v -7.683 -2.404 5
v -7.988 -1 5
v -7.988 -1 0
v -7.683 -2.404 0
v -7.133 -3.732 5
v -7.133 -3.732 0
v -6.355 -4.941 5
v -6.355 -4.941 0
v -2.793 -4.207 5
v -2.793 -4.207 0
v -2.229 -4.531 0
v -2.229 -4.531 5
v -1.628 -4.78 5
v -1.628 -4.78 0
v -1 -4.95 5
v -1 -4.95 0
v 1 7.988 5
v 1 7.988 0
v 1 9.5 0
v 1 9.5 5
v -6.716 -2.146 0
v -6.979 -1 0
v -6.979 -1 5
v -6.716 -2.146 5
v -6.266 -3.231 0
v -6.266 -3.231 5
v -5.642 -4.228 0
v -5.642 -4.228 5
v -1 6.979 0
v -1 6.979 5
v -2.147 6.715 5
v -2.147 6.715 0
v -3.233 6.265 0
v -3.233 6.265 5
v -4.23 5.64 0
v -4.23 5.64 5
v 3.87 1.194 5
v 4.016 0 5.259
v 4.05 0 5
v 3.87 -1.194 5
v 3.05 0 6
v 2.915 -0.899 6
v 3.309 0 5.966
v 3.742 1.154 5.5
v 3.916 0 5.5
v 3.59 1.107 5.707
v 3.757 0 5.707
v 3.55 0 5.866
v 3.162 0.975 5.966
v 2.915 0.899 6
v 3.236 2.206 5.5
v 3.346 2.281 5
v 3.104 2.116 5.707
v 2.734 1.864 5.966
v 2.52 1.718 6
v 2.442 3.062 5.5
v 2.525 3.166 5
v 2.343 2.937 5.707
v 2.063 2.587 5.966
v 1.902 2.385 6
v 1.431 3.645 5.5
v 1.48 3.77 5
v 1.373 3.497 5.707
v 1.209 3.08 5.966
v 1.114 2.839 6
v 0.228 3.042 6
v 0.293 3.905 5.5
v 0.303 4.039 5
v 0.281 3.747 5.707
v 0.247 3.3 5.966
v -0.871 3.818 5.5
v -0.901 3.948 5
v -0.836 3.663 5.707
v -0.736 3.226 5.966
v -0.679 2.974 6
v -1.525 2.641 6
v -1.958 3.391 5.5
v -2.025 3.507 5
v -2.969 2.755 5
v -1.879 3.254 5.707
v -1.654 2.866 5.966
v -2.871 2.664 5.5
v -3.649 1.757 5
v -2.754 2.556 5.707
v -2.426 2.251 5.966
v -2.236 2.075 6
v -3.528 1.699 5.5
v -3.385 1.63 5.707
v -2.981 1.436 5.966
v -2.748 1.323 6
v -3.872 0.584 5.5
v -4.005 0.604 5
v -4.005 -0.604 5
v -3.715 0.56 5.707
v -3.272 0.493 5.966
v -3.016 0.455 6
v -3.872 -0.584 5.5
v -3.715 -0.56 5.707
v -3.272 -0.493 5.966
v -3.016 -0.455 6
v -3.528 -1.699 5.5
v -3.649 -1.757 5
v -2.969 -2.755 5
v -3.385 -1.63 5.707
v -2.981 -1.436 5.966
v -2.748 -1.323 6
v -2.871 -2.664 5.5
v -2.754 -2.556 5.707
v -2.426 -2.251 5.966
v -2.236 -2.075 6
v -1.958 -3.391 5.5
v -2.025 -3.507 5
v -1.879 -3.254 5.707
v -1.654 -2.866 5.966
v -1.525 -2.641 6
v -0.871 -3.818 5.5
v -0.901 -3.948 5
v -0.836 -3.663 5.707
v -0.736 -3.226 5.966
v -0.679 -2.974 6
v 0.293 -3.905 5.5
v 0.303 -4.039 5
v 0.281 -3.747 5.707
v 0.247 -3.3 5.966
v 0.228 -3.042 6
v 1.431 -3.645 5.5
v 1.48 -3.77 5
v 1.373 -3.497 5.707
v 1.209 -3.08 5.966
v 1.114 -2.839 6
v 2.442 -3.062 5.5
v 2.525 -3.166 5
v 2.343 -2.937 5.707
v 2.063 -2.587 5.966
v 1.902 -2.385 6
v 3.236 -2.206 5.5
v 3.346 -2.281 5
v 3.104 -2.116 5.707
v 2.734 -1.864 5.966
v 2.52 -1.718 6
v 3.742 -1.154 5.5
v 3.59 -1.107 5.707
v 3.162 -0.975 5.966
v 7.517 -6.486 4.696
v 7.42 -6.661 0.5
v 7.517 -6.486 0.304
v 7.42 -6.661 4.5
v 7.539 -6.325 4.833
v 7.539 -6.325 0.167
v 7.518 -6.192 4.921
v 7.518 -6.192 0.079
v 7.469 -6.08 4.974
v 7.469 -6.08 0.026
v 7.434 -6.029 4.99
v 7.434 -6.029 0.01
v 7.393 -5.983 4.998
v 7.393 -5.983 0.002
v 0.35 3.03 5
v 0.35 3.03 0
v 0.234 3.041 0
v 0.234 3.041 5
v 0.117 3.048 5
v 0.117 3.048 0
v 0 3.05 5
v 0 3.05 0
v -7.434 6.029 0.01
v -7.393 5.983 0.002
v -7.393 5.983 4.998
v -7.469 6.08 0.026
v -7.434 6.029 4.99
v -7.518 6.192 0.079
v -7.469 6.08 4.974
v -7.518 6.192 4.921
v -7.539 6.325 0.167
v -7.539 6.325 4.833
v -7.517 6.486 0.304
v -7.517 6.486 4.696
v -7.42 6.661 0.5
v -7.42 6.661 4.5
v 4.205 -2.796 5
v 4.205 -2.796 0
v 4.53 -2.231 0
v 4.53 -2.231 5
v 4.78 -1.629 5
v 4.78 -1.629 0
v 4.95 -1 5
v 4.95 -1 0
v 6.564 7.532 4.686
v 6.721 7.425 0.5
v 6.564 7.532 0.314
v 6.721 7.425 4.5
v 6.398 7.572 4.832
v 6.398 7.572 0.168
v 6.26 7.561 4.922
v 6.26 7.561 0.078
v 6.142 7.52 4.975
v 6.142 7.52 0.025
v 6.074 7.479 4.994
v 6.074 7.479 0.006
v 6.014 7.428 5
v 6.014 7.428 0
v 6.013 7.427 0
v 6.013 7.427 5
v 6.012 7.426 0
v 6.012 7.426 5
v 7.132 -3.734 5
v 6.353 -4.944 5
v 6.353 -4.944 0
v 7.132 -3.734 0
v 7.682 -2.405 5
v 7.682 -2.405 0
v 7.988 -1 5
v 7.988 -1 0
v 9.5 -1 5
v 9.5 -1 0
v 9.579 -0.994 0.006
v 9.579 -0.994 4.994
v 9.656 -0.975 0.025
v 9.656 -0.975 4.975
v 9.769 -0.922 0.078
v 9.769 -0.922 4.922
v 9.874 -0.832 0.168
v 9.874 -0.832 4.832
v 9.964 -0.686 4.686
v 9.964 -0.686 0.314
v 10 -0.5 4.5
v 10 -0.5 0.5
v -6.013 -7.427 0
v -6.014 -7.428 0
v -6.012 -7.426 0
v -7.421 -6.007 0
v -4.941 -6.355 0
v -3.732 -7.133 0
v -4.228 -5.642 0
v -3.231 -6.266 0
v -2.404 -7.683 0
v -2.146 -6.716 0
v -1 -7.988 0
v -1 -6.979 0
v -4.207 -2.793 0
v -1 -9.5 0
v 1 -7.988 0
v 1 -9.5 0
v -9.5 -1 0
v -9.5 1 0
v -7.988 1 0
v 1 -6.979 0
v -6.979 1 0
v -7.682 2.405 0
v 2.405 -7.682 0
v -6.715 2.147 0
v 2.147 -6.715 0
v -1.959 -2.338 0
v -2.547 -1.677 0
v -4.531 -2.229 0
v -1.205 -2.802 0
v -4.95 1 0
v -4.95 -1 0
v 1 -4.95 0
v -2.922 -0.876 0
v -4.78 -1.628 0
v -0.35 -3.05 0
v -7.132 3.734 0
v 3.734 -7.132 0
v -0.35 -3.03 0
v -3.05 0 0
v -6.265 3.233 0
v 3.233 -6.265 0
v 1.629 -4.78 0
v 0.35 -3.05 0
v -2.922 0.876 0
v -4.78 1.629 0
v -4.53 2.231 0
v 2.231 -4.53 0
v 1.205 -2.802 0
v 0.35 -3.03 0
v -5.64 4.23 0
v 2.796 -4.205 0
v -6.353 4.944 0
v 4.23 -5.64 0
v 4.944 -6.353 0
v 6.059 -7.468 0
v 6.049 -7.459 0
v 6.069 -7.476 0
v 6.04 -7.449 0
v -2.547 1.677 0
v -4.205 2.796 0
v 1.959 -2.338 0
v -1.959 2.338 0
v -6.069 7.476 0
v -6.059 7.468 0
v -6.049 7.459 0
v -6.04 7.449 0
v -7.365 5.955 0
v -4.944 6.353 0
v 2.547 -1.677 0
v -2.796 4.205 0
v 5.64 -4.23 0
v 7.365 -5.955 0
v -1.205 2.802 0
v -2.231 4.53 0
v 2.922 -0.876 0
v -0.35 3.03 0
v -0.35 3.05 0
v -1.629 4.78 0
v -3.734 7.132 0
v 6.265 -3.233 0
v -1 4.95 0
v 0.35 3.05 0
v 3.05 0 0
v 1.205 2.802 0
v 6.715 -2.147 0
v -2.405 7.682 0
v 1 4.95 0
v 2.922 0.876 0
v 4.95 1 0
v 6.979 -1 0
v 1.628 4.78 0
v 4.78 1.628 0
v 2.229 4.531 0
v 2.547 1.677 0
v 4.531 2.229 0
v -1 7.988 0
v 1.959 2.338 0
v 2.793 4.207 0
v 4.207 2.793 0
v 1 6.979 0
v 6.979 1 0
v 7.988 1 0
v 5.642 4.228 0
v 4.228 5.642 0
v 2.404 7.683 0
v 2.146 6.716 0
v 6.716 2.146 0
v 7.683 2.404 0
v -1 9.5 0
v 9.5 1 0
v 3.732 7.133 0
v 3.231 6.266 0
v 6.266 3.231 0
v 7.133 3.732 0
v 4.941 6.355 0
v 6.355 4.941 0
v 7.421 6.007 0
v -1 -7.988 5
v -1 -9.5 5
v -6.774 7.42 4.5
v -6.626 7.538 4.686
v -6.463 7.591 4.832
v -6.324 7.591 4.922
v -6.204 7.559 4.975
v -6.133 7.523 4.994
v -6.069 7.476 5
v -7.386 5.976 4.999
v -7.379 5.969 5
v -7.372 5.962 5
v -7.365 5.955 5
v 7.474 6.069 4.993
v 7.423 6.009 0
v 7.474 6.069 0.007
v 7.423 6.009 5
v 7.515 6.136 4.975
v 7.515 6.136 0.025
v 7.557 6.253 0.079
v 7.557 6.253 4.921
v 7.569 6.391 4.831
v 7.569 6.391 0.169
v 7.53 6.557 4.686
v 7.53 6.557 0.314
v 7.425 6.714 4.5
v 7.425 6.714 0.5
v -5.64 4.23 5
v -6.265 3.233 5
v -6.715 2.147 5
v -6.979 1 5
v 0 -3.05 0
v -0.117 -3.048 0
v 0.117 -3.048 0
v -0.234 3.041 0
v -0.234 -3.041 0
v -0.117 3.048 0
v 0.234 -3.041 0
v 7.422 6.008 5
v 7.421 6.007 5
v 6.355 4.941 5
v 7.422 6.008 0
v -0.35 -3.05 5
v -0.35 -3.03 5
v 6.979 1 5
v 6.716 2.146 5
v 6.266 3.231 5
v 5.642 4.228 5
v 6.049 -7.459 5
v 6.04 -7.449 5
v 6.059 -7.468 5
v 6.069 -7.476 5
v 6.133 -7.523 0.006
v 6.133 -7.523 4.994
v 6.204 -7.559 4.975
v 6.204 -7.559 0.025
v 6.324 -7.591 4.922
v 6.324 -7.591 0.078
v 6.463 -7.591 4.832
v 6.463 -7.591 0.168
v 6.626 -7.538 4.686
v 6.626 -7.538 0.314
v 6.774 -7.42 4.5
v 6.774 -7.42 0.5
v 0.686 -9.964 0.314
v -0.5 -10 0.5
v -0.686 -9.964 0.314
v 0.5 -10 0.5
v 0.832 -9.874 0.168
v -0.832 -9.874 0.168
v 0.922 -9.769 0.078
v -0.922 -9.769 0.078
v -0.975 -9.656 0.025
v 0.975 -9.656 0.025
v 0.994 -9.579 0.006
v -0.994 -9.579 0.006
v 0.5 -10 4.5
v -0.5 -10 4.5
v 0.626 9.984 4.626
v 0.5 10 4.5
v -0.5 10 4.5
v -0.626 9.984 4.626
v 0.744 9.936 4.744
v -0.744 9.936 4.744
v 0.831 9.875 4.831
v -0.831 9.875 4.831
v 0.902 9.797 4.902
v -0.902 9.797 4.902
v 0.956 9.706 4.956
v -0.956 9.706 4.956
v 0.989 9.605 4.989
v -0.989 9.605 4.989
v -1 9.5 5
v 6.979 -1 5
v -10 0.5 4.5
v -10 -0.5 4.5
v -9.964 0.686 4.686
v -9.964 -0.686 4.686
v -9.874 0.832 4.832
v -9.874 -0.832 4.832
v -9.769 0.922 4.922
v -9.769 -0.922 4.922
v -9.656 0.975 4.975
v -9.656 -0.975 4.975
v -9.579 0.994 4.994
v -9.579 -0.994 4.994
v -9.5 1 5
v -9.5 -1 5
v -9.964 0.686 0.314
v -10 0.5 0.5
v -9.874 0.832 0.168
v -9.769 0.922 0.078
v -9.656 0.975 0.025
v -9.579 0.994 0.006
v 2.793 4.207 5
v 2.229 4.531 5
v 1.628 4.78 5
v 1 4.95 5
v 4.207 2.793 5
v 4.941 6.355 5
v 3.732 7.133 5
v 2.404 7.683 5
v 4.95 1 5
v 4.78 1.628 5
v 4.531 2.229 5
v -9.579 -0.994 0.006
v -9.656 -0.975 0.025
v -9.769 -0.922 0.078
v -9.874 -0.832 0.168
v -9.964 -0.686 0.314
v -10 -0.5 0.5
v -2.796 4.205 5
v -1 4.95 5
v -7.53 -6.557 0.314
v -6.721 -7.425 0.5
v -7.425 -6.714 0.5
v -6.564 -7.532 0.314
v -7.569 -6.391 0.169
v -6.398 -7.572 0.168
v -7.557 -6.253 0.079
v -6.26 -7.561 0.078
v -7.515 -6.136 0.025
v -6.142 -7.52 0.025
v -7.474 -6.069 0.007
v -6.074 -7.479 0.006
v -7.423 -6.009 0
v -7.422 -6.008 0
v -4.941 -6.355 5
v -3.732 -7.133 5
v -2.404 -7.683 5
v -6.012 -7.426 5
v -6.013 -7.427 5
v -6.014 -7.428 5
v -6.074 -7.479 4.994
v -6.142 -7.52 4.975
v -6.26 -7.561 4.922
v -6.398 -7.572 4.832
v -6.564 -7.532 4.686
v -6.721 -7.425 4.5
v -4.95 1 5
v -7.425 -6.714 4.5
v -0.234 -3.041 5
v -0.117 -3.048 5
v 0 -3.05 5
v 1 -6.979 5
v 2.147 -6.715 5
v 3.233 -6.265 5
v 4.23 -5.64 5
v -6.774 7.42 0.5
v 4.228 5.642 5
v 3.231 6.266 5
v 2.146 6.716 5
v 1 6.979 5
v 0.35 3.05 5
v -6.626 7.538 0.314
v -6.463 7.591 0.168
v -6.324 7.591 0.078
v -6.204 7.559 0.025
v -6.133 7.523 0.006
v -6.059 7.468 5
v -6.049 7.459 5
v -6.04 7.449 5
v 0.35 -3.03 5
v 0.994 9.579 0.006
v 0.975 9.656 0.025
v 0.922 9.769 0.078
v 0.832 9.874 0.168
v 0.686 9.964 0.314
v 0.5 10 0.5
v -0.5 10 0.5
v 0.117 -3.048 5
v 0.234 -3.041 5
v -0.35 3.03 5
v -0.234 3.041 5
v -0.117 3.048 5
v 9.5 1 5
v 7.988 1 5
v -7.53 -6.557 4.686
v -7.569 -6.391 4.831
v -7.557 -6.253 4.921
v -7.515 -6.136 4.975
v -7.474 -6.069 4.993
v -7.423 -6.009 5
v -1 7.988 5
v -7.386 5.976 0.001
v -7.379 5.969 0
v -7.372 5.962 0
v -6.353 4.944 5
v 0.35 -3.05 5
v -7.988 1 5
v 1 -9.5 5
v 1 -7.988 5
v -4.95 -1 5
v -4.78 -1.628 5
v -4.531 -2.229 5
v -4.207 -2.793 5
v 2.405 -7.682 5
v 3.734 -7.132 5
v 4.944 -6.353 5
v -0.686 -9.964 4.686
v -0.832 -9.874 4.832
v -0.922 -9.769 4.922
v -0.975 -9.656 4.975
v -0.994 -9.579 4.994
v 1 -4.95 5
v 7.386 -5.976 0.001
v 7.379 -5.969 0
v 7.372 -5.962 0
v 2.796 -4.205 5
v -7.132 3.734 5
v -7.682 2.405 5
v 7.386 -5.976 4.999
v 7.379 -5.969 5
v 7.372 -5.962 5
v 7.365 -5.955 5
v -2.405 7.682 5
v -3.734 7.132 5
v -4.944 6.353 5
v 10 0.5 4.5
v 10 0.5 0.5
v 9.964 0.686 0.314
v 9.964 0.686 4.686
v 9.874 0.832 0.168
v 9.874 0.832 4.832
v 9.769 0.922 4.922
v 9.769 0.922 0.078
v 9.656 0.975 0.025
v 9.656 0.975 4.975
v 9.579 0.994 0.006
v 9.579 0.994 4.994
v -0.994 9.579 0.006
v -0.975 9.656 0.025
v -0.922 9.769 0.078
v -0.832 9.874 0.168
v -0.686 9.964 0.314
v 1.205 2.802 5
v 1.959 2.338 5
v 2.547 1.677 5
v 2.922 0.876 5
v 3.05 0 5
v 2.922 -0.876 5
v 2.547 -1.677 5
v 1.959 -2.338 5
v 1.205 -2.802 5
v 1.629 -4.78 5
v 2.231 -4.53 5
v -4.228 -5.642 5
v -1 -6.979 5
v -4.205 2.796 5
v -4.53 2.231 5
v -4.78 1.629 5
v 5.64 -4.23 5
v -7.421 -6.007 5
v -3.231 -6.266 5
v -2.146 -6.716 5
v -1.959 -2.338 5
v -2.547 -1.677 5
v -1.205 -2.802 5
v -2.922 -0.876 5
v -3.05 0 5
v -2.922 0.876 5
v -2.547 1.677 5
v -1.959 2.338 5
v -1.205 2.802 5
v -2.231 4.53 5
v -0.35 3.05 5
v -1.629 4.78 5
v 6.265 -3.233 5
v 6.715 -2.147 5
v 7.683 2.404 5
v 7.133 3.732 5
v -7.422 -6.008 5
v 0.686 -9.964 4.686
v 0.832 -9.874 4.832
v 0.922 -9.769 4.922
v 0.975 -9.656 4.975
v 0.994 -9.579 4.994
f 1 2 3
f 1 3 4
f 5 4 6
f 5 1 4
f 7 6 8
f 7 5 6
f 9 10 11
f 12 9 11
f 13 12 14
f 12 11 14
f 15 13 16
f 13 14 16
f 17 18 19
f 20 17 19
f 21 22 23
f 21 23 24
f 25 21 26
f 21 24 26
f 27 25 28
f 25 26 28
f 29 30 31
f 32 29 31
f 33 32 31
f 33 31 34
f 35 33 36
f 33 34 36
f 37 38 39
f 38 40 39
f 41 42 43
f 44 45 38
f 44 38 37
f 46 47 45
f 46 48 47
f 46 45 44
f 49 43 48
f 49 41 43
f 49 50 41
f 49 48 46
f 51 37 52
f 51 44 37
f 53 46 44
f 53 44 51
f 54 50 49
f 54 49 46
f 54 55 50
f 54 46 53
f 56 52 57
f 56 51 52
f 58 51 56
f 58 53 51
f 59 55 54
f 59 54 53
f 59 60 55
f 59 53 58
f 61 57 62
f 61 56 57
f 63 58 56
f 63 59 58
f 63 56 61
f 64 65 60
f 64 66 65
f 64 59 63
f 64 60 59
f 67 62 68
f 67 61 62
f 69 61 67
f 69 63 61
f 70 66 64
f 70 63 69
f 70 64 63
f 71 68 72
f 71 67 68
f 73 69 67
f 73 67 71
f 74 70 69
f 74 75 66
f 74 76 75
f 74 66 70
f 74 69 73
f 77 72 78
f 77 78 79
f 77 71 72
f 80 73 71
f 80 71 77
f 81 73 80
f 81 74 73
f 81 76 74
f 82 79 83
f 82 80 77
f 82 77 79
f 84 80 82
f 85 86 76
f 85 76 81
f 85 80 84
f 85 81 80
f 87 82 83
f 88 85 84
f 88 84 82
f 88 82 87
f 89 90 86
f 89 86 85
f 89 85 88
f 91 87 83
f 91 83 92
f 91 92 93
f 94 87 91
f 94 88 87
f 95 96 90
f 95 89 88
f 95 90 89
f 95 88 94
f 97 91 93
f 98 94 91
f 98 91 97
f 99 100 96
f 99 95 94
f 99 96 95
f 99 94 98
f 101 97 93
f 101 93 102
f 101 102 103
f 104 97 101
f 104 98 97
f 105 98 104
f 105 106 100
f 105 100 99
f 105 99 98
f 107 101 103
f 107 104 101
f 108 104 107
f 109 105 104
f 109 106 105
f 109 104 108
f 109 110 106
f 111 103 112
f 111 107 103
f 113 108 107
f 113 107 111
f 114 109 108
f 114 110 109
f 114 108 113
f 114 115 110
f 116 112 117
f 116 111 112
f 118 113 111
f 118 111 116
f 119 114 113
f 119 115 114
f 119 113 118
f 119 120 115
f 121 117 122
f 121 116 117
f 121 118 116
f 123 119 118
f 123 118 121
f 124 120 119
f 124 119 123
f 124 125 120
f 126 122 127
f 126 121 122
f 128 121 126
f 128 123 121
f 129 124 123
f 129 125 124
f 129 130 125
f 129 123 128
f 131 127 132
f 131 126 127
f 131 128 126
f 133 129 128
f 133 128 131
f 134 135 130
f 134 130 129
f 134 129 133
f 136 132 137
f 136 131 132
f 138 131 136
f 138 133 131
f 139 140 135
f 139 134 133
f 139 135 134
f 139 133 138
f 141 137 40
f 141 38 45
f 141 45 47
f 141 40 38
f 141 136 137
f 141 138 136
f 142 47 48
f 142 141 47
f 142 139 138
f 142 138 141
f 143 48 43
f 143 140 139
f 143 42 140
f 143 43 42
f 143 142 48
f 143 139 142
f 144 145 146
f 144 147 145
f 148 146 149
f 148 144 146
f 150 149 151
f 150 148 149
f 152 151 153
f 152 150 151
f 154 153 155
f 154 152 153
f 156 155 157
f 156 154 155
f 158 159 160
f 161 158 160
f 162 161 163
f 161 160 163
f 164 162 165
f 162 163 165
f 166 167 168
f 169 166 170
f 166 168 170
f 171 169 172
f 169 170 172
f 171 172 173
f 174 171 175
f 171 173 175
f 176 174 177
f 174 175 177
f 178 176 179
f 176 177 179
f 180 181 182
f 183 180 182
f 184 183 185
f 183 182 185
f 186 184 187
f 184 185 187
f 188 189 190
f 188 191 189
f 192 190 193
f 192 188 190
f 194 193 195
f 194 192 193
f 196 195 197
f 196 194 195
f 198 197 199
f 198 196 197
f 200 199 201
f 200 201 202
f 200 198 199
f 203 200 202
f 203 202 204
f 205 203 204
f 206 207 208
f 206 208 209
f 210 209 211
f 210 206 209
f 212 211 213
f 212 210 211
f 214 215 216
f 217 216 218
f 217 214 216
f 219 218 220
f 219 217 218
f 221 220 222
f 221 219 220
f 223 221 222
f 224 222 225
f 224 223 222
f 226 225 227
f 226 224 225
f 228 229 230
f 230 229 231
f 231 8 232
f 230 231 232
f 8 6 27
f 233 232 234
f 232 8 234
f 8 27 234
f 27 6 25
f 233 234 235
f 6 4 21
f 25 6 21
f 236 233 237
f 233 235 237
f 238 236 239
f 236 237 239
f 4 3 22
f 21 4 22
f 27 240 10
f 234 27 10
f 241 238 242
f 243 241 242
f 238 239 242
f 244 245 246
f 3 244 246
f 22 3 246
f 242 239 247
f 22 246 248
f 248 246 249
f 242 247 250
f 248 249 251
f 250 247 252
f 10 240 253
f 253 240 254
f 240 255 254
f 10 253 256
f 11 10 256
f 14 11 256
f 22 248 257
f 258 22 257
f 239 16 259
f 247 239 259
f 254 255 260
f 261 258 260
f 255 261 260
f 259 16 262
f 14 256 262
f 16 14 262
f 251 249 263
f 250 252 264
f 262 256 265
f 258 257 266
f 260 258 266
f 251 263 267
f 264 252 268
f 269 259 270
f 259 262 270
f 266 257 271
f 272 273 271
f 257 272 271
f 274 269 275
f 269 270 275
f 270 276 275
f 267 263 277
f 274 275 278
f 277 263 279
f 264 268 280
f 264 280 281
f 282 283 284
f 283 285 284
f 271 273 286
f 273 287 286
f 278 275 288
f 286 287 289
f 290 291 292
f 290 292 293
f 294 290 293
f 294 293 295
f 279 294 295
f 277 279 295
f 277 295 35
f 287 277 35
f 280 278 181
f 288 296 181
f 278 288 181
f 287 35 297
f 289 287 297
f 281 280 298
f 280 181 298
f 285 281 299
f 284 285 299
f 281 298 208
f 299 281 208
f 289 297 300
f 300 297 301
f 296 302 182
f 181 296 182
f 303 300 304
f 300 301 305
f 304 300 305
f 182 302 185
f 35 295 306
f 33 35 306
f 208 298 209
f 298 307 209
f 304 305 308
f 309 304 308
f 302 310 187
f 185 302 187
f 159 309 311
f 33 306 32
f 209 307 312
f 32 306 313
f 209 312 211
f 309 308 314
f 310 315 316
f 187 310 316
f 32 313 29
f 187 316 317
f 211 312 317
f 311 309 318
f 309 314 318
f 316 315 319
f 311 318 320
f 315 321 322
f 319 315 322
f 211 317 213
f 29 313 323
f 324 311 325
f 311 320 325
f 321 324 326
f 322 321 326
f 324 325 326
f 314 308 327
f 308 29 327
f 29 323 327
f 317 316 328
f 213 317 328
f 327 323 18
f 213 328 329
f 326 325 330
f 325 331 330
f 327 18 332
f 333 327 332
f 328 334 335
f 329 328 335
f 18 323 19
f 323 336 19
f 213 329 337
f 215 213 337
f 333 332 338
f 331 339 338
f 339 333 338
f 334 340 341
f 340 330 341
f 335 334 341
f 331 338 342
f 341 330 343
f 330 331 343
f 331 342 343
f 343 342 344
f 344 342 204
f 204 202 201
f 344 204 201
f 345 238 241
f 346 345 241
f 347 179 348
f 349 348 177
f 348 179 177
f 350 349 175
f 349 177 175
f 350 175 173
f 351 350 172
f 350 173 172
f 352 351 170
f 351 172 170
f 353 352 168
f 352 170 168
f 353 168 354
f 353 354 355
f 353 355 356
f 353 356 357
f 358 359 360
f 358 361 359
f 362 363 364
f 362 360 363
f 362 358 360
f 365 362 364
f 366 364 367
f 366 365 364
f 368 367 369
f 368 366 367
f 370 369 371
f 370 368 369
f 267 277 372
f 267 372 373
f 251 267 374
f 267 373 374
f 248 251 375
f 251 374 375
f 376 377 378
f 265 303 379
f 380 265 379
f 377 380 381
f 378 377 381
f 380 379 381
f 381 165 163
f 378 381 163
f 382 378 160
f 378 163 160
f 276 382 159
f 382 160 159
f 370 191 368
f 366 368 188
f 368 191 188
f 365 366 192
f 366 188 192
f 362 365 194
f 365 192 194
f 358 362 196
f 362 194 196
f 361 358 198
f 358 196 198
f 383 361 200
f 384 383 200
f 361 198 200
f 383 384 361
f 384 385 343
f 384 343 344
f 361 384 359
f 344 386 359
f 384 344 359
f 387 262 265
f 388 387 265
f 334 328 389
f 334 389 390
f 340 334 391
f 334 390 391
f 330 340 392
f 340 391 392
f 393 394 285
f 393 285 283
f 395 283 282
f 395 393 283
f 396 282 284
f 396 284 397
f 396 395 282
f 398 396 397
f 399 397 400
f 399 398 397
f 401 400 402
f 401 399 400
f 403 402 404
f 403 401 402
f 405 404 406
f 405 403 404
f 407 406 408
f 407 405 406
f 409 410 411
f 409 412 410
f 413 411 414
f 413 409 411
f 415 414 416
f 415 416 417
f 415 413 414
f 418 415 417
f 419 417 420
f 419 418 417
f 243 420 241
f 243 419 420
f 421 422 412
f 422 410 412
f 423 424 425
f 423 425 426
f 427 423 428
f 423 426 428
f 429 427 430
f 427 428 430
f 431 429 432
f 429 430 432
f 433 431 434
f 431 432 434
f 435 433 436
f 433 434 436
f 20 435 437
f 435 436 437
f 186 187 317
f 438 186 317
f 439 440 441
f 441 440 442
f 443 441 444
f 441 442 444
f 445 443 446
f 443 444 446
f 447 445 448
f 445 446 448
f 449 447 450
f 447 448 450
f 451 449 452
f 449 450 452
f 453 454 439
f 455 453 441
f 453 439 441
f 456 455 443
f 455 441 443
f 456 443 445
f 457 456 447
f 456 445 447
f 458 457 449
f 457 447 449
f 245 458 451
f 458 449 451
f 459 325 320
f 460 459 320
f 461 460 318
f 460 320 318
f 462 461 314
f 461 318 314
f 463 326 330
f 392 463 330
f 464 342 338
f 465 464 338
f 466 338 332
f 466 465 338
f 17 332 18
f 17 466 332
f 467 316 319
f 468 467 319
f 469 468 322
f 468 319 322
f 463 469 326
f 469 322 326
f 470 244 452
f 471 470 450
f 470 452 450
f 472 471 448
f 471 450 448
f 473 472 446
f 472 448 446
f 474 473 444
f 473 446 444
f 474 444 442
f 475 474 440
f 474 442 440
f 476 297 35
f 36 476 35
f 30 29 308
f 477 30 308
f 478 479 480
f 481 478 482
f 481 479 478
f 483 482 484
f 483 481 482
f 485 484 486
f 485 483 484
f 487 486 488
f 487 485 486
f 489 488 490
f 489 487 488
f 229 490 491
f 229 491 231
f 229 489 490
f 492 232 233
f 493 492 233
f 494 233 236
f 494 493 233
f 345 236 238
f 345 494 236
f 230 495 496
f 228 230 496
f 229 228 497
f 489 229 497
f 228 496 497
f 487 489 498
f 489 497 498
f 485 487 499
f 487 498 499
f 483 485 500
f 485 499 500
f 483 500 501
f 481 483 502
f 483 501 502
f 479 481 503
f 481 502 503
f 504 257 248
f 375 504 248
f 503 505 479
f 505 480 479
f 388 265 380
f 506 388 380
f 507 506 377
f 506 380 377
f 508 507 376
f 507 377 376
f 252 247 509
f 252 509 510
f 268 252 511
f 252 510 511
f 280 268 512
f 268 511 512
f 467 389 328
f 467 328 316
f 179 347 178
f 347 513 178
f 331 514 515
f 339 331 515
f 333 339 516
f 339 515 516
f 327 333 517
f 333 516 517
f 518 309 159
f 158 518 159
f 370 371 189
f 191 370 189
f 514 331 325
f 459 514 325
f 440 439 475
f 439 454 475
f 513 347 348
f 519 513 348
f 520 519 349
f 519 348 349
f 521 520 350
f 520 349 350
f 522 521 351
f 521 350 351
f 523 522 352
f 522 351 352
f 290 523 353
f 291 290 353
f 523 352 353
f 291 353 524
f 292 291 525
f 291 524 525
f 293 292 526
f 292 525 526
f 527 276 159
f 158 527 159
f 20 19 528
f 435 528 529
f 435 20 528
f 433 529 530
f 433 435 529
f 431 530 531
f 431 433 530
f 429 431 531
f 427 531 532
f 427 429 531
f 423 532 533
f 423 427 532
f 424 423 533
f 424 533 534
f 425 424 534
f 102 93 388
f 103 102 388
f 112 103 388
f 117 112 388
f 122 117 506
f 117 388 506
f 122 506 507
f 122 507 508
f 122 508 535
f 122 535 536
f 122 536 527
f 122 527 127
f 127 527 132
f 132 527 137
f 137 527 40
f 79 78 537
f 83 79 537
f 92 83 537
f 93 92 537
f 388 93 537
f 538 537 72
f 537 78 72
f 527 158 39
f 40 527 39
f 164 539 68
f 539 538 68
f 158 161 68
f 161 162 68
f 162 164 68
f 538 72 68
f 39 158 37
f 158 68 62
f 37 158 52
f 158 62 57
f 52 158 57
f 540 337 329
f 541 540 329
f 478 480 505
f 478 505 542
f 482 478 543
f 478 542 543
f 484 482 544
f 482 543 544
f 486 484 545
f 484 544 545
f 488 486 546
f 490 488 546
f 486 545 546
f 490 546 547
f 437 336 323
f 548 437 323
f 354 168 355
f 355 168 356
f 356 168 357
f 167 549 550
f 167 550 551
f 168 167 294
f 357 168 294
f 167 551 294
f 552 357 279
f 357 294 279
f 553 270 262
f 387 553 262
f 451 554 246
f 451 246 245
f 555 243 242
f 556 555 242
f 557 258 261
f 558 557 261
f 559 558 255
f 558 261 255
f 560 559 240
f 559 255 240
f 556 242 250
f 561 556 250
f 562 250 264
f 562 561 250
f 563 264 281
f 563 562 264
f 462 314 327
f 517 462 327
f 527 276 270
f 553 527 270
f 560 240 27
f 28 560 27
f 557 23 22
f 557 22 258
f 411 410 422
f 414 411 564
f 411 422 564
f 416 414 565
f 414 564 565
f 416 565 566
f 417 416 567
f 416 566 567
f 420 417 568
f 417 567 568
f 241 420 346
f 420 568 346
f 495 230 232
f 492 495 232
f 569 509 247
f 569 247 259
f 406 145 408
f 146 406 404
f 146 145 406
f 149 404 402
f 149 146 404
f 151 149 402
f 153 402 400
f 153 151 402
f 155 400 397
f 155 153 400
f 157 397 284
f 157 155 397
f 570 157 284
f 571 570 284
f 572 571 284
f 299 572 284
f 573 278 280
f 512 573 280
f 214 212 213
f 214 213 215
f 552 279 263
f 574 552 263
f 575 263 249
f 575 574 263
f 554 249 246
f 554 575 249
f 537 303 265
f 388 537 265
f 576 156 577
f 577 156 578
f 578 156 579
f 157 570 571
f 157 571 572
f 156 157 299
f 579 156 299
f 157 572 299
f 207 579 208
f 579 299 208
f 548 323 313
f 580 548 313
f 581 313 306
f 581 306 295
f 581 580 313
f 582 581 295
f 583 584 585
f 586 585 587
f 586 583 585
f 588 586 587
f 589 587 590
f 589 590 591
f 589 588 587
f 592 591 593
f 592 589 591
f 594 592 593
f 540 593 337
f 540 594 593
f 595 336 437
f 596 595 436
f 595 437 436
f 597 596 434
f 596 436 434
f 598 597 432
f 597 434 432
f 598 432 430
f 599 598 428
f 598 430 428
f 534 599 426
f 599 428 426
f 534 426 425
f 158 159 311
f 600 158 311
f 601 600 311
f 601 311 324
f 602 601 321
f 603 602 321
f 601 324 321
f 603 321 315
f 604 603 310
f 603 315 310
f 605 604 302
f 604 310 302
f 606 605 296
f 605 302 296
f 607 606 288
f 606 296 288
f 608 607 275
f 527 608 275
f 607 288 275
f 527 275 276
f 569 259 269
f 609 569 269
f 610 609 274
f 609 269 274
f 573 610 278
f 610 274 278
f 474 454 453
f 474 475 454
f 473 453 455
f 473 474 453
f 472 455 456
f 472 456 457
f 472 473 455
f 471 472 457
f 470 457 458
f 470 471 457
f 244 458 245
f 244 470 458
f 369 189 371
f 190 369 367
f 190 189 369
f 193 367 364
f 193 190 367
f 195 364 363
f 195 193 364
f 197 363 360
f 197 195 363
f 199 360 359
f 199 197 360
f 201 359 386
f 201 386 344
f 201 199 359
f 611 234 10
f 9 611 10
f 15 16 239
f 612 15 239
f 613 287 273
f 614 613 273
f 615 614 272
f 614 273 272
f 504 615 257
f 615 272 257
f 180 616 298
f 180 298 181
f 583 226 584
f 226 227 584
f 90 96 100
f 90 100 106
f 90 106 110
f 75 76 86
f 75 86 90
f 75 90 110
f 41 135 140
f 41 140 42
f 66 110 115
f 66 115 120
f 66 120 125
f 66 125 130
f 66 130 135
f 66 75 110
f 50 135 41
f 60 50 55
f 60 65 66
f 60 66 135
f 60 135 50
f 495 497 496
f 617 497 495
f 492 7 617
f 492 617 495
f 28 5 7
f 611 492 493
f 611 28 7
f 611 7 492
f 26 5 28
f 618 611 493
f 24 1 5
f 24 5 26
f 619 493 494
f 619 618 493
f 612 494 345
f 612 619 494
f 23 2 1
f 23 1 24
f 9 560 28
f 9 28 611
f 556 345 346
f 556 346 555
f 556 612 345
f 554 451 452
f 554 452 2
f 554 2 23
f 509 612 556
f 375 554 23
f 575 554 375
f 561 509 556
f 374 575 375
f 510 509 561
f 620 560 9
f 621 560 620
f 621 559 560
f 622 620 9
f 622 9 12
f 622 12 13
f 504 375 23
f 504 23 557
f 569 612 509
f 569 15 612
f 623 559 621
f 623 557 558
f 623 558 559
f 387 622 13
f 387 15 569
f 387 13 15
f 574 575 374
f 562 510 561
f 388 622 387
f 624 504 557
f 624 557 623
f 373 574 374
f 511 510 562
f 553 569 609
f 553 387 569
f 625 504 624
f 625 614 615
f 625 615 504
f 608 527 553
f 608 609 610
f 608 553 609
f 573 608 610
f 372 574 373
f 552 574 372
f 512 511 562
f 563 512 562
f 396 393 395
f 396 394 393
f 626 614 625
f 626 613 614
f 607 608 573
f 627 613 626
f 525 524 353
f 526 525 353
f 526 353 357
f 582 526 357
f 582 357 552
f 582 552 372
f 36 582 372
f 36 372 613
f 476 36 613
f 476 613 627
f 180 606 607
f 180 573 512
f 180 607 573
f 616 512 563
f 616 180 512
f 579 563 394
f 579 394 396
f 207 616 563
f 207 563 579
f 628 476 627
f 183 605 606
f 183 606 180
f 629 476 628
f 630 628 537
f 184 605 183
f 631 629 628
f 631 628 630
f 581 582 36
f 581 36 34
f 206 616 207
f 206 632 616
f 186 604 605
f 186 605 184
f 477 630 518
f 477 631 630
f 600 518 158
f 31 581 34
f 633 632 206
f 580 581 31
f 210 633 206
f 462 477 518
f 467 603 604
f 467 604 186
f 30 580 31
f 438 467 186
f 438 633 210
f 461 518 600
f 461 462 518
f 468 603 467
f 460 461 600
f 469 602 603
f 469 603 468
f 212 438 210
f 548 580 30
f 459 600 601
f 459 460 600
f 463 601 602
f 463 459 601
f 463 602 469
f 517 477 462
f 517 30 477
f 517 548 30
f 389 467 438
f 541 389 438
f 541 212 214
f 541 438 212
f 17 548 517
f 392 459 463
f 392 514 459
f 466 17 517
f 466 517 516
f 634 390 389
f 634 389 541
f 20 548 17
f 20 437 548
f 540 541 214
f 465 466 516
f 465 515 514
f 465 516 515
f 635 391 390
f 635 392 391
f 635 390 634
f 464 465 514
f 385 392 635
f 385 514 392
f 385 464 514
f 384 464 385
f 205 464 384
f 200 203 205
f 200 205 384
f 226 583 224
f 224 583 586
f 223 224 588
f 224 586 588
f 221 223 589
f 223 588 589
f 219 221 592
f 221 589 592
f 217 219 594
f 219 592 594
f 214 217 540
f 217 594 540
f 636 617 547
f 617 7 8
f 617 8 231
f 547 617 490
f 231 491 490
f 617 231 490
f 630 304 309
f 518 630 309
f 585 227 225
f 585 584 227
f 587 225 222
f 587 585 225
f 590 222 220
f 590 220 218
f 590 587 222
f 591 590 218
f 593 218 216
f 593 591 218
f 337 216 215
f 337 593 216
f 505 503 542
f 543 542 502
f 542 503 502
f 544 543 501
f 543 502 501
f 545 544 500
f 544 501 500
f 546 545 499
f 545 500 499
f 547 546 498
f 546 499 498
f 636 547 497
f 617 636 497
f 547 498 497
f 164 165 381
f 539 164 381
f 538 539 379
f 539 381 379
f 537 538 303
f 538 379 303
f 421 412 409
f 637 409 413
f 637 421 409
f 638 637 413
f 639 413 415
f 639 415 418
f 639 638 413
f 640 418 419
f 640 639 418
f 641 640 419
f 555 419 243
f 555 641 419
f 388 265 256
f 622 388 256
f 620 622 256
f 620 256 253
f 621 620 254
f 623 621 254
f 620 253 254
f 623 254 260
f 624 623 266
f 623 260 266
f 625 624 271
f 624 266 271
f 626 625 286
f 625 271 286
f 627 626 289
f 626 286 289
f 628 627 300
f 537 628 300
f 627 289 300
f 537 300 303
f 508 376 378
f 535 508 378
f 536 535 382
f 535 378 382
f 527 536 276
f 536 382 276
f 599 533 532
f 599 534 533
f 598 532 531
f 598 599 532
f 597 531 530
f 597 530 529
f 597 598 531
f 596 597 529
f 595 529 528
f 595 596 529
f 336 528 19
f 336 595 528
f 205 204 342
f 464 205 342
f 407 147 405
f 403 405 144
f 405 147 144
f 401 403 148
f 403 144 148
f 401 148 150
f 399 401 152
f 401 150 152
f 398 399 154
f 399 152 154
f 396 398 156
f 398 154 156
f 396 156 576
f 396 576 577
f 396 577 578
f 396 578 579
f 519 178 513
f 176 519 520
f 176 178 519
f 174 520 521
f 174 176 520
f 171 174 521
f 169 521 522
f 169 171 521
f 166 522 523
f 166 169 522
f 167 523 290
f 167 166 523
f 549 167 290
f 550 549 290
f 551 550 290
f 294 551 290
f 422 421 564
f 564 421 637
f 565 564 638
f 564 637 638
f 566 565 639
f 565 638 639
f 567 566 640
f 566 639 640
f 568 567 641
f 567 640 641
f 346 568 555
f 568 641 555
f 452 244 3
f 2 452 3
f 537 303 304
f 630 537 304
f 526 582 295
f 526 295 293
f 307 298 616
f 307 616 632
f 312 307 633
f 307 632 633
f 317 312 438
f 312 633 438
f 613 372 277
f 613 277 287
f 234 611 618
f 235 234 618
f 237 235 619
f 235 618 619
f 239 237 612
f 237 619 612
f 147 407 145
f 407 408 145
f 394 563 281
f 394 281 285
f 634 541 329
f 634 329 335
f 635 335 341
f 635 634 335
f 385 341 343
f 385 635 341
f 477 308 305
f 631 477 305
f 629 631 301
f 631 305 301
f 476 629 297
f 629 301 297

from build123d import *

# Parameters (mm, degrees)
BOSS_EXTRUDE1_DEPTH   = 5
BOSS_EXTRUDE1_2_DEPTH = 5
FILLET1_R             = 0.5
SKETCH2_R             = 8.05
SKETCH2_R_2           = 7.05
BOSS_EXTRUDE2_DEPTH   = 5
SKETCH6_R             = 4.05
BOSS_EXTRUDE8_DEPTH   = 1
FILLET2_R             = 1


with BuildPart() as part:
    # Sketch1 → Boss-Extrude1 (new body)
    with BuildSketch(Plane.XY):
        with BuildLine():
            Line((-1, -10), (1, -10))
            Line((1, -10), (1, -4.95))
            ThreePointArc((1, -4.95), (1.934056641, -4.664967836), (2.795786265, -4.205482037))
            Line((2.795786265, -4.205482037), (6.422695211, -7.832390982))
            Line((6.422695211, -7.832390982), (7.719440413, -6.309744641))
            Line((7.719440413, -6.309744641), (4.205482037, -2.795786265))
            ThreePointArc((4.205482037, -2.795786265), (4.664967836, -1.934056641), (4.95, -1))
            Line((4.95, -1), (10, -1))
            Line((10, -1), (10, 1))
            Line((10, 1), (4.95, 1))
            ThreePointArc((4.95, 1), (4.665589357, 1.932556844), (4.20727875, 2.793081724))
            Line((4.20727875, 2.793081724), (7.774746809, 6.360549784))
            Line((7.774746809, 6.360549784), (6.367388814, 7.78158584))
            Line((6.367388814, 7.78158584), (2.793081724, 4.20727875))
            ThreePointArc((2.793081724, 4.20727875), (1.932556844, 4.665589357), (1, 4.95))
            Line((1, 4.95), (1, 10))
            Line((1, 10), (-1, 10))
            Line((-1, 10), (-1, 4.95))
            ThreePointArc((-1, 4.95), (-1.934056641, 4.664967836), (-2.795786265, 4.205482037))
            Line((-2.795786265, 4.205482037), (-6.422695211, 7.832390982))
            Line((-6.422695211, 7.832390982), (-7.719440413, 6.309744641))
            Line((-7.719440413, 6.309744641), (-4.205482037, 2.795786265))
            ThreePointArc((-4.205482037, 2.795786265), (-4.664967836, 1.934056641), (-4.95, 1))
            Line((-4.95, 1), (-10, 1))
            Line((-10, 1), (-10, -1))
            Line((-10, -1), (-4.95, -1))
            ThreePointArc((-4.95, -1), (-4.665589357, -1.932556844), (-4.20727875, -2.793081724))
            Line((-4.20727875, -2.793081724), (-7.774746809, -6.360549784))
            Line((-7.774746809, -6.360549784), (-6.367388814, -7.78158584))
            Line((-6.367388814, -7.78158584), (-2.793081724, -4.20727875))
            ThreePointArc((-2.793081724, -4.20727875), (-1.932556844, -4.665589357), (-1, -4.95))
            Line((-1, -4.95), (-1, -10))
        make_face()
        with BuildLine():
            Line((0.35, -3.029851482), (0.35, -3.05))
            Line((0.35, -3.05), (0, -3.05))
            Line((0, -3.05), (-0.35, -3.05))
            Line((-0.35, -3.05), (-0.35, -3.029851482))
            ThreePointArc((-0.35, -3.029851482), (-3.05, 0), (-0.35, 3.029851482))
            Line((-0.35, 3.029851482), (-0.35, 3.05))
            Line((-0.35, 3.05), (0, 3.05))
            Line((0, 3.05), (0.35, 3.05))
            Line((0.35, 3.05), (0.35, 3.029851482))
            ThreePointArc((0.35, 3.029851482), (3.05, 0), (0.35, -3.029851482))
        make_face(mode=Mode.SUBTRACT)
    extrude(amount=BOSS_EXTRUDE1_DEPTH)

    # Fillet1
    fillet1_edges = [part.edges().sort_by_distance(p)[0] for p in [
        (-7.071067812, 7.071067812, 5),
        (-10, 0, 5),
        (-7.071067812, -7.071067812, 5),
        (0, -10, 5),
        (7.071067812, -7.071067812, 5),
        (10, 0, 5),
        (10, 0, 0),
        (7.071067812, -7.071067812, 0),
        (0, -10, 0),
        (-7.071067812, -7.071067812, 0),
        (-10, 0, 0),
        (-7.071067812, 7.071067812, 0),
        (0, 10, 0),
        (7.071067812, 7.071067812, 0),
        (7.071067812, 7.071067812, 5),
        (10, 1, 2.5),
        (10, -1, 2.5),
        (7.719440413, -6.309744641, 2.5),
        (6.422695211, -7.832390982, 2.5),
        (1, -10, 2.5),
        (-1, -10, 2.5),
        (-6.367388814, -7.78158584, 2.5),
        (-7.774746809, -6.360549784, 2.5),
        (-10, -1, 2.5),
        (-10, 1, 2.5),
        (-7.719440413, 6.309744641, 2.5),
        (-6.422695211, 7.832390982, 2.5),
        (-1, 10, 2.5),
        (1, 10, 2.5),
        (6.367388814, 7.78158584, 2.5),
        (7.774746809, 6.360549784, 2.5),
        (0, 10, 5),
    ]]
    fillet(fillet1_edges, radius=FILLET1_R)

    # Sketch2 → Boss-Extrude2 (add)
    with BuildSketch(Plane.XY.offset(5)):
        Circle(SKETCH2_R)
        Circle(SKETCH2_R_2, mode=Mode.SUBTRACT)
    extrude(amount=-BOSS_EXTRUDE2_DEPTH)


with BuildPart() as body_2:
    # Sketch1 → Boss-Extrude1 2 (new body)
    with BuildSketch(Plane.XY):
        with BuildLine():
            ThreePointArc((0, -3.05), (0.175289734, -3.044958704), (0.35, -3.029851482))
            Line((0.35, -3.029851482), (0.35, 3.029851482))
            ThreePointArc((0.35, 3.029851482), (0.175289734, 3.044958704), (0, 3.05))
            ThreePointArc((0, 3.05), (-0.175289734, 3.044958704), (-0.35, 3.029851482))
            Line((-0.35, 3.029851482), (-0.35, -3.029851482))
            ThreePointArc((-0.35, -3.029851482), (-0.175289734, -3.044958704), (0, -3.05))
        make_face()
    extrude(amount=BOSS_EXTRUDE1_2_DEPTH)

    # Sketch6 → Boss-Extrude8 (add)
    with BuildSketch(Plane.XY.offset(5)):
        Circle(SKETCH6_R)
    extrude(amount=BOSS_EXTRUDE8_DEPTH)

    # Fillet2
    fillet2_edges = [body_2.edges().sort_by_distance(p)[0] for p in [
        (-4.05, 0, 6),
    ]]
    fillet(fillet2_edges, radius=FILLET2_R - 0.0001)  # a hair under: the kernel refuses the full size


solid = Compound([part.part, body_2.part])
